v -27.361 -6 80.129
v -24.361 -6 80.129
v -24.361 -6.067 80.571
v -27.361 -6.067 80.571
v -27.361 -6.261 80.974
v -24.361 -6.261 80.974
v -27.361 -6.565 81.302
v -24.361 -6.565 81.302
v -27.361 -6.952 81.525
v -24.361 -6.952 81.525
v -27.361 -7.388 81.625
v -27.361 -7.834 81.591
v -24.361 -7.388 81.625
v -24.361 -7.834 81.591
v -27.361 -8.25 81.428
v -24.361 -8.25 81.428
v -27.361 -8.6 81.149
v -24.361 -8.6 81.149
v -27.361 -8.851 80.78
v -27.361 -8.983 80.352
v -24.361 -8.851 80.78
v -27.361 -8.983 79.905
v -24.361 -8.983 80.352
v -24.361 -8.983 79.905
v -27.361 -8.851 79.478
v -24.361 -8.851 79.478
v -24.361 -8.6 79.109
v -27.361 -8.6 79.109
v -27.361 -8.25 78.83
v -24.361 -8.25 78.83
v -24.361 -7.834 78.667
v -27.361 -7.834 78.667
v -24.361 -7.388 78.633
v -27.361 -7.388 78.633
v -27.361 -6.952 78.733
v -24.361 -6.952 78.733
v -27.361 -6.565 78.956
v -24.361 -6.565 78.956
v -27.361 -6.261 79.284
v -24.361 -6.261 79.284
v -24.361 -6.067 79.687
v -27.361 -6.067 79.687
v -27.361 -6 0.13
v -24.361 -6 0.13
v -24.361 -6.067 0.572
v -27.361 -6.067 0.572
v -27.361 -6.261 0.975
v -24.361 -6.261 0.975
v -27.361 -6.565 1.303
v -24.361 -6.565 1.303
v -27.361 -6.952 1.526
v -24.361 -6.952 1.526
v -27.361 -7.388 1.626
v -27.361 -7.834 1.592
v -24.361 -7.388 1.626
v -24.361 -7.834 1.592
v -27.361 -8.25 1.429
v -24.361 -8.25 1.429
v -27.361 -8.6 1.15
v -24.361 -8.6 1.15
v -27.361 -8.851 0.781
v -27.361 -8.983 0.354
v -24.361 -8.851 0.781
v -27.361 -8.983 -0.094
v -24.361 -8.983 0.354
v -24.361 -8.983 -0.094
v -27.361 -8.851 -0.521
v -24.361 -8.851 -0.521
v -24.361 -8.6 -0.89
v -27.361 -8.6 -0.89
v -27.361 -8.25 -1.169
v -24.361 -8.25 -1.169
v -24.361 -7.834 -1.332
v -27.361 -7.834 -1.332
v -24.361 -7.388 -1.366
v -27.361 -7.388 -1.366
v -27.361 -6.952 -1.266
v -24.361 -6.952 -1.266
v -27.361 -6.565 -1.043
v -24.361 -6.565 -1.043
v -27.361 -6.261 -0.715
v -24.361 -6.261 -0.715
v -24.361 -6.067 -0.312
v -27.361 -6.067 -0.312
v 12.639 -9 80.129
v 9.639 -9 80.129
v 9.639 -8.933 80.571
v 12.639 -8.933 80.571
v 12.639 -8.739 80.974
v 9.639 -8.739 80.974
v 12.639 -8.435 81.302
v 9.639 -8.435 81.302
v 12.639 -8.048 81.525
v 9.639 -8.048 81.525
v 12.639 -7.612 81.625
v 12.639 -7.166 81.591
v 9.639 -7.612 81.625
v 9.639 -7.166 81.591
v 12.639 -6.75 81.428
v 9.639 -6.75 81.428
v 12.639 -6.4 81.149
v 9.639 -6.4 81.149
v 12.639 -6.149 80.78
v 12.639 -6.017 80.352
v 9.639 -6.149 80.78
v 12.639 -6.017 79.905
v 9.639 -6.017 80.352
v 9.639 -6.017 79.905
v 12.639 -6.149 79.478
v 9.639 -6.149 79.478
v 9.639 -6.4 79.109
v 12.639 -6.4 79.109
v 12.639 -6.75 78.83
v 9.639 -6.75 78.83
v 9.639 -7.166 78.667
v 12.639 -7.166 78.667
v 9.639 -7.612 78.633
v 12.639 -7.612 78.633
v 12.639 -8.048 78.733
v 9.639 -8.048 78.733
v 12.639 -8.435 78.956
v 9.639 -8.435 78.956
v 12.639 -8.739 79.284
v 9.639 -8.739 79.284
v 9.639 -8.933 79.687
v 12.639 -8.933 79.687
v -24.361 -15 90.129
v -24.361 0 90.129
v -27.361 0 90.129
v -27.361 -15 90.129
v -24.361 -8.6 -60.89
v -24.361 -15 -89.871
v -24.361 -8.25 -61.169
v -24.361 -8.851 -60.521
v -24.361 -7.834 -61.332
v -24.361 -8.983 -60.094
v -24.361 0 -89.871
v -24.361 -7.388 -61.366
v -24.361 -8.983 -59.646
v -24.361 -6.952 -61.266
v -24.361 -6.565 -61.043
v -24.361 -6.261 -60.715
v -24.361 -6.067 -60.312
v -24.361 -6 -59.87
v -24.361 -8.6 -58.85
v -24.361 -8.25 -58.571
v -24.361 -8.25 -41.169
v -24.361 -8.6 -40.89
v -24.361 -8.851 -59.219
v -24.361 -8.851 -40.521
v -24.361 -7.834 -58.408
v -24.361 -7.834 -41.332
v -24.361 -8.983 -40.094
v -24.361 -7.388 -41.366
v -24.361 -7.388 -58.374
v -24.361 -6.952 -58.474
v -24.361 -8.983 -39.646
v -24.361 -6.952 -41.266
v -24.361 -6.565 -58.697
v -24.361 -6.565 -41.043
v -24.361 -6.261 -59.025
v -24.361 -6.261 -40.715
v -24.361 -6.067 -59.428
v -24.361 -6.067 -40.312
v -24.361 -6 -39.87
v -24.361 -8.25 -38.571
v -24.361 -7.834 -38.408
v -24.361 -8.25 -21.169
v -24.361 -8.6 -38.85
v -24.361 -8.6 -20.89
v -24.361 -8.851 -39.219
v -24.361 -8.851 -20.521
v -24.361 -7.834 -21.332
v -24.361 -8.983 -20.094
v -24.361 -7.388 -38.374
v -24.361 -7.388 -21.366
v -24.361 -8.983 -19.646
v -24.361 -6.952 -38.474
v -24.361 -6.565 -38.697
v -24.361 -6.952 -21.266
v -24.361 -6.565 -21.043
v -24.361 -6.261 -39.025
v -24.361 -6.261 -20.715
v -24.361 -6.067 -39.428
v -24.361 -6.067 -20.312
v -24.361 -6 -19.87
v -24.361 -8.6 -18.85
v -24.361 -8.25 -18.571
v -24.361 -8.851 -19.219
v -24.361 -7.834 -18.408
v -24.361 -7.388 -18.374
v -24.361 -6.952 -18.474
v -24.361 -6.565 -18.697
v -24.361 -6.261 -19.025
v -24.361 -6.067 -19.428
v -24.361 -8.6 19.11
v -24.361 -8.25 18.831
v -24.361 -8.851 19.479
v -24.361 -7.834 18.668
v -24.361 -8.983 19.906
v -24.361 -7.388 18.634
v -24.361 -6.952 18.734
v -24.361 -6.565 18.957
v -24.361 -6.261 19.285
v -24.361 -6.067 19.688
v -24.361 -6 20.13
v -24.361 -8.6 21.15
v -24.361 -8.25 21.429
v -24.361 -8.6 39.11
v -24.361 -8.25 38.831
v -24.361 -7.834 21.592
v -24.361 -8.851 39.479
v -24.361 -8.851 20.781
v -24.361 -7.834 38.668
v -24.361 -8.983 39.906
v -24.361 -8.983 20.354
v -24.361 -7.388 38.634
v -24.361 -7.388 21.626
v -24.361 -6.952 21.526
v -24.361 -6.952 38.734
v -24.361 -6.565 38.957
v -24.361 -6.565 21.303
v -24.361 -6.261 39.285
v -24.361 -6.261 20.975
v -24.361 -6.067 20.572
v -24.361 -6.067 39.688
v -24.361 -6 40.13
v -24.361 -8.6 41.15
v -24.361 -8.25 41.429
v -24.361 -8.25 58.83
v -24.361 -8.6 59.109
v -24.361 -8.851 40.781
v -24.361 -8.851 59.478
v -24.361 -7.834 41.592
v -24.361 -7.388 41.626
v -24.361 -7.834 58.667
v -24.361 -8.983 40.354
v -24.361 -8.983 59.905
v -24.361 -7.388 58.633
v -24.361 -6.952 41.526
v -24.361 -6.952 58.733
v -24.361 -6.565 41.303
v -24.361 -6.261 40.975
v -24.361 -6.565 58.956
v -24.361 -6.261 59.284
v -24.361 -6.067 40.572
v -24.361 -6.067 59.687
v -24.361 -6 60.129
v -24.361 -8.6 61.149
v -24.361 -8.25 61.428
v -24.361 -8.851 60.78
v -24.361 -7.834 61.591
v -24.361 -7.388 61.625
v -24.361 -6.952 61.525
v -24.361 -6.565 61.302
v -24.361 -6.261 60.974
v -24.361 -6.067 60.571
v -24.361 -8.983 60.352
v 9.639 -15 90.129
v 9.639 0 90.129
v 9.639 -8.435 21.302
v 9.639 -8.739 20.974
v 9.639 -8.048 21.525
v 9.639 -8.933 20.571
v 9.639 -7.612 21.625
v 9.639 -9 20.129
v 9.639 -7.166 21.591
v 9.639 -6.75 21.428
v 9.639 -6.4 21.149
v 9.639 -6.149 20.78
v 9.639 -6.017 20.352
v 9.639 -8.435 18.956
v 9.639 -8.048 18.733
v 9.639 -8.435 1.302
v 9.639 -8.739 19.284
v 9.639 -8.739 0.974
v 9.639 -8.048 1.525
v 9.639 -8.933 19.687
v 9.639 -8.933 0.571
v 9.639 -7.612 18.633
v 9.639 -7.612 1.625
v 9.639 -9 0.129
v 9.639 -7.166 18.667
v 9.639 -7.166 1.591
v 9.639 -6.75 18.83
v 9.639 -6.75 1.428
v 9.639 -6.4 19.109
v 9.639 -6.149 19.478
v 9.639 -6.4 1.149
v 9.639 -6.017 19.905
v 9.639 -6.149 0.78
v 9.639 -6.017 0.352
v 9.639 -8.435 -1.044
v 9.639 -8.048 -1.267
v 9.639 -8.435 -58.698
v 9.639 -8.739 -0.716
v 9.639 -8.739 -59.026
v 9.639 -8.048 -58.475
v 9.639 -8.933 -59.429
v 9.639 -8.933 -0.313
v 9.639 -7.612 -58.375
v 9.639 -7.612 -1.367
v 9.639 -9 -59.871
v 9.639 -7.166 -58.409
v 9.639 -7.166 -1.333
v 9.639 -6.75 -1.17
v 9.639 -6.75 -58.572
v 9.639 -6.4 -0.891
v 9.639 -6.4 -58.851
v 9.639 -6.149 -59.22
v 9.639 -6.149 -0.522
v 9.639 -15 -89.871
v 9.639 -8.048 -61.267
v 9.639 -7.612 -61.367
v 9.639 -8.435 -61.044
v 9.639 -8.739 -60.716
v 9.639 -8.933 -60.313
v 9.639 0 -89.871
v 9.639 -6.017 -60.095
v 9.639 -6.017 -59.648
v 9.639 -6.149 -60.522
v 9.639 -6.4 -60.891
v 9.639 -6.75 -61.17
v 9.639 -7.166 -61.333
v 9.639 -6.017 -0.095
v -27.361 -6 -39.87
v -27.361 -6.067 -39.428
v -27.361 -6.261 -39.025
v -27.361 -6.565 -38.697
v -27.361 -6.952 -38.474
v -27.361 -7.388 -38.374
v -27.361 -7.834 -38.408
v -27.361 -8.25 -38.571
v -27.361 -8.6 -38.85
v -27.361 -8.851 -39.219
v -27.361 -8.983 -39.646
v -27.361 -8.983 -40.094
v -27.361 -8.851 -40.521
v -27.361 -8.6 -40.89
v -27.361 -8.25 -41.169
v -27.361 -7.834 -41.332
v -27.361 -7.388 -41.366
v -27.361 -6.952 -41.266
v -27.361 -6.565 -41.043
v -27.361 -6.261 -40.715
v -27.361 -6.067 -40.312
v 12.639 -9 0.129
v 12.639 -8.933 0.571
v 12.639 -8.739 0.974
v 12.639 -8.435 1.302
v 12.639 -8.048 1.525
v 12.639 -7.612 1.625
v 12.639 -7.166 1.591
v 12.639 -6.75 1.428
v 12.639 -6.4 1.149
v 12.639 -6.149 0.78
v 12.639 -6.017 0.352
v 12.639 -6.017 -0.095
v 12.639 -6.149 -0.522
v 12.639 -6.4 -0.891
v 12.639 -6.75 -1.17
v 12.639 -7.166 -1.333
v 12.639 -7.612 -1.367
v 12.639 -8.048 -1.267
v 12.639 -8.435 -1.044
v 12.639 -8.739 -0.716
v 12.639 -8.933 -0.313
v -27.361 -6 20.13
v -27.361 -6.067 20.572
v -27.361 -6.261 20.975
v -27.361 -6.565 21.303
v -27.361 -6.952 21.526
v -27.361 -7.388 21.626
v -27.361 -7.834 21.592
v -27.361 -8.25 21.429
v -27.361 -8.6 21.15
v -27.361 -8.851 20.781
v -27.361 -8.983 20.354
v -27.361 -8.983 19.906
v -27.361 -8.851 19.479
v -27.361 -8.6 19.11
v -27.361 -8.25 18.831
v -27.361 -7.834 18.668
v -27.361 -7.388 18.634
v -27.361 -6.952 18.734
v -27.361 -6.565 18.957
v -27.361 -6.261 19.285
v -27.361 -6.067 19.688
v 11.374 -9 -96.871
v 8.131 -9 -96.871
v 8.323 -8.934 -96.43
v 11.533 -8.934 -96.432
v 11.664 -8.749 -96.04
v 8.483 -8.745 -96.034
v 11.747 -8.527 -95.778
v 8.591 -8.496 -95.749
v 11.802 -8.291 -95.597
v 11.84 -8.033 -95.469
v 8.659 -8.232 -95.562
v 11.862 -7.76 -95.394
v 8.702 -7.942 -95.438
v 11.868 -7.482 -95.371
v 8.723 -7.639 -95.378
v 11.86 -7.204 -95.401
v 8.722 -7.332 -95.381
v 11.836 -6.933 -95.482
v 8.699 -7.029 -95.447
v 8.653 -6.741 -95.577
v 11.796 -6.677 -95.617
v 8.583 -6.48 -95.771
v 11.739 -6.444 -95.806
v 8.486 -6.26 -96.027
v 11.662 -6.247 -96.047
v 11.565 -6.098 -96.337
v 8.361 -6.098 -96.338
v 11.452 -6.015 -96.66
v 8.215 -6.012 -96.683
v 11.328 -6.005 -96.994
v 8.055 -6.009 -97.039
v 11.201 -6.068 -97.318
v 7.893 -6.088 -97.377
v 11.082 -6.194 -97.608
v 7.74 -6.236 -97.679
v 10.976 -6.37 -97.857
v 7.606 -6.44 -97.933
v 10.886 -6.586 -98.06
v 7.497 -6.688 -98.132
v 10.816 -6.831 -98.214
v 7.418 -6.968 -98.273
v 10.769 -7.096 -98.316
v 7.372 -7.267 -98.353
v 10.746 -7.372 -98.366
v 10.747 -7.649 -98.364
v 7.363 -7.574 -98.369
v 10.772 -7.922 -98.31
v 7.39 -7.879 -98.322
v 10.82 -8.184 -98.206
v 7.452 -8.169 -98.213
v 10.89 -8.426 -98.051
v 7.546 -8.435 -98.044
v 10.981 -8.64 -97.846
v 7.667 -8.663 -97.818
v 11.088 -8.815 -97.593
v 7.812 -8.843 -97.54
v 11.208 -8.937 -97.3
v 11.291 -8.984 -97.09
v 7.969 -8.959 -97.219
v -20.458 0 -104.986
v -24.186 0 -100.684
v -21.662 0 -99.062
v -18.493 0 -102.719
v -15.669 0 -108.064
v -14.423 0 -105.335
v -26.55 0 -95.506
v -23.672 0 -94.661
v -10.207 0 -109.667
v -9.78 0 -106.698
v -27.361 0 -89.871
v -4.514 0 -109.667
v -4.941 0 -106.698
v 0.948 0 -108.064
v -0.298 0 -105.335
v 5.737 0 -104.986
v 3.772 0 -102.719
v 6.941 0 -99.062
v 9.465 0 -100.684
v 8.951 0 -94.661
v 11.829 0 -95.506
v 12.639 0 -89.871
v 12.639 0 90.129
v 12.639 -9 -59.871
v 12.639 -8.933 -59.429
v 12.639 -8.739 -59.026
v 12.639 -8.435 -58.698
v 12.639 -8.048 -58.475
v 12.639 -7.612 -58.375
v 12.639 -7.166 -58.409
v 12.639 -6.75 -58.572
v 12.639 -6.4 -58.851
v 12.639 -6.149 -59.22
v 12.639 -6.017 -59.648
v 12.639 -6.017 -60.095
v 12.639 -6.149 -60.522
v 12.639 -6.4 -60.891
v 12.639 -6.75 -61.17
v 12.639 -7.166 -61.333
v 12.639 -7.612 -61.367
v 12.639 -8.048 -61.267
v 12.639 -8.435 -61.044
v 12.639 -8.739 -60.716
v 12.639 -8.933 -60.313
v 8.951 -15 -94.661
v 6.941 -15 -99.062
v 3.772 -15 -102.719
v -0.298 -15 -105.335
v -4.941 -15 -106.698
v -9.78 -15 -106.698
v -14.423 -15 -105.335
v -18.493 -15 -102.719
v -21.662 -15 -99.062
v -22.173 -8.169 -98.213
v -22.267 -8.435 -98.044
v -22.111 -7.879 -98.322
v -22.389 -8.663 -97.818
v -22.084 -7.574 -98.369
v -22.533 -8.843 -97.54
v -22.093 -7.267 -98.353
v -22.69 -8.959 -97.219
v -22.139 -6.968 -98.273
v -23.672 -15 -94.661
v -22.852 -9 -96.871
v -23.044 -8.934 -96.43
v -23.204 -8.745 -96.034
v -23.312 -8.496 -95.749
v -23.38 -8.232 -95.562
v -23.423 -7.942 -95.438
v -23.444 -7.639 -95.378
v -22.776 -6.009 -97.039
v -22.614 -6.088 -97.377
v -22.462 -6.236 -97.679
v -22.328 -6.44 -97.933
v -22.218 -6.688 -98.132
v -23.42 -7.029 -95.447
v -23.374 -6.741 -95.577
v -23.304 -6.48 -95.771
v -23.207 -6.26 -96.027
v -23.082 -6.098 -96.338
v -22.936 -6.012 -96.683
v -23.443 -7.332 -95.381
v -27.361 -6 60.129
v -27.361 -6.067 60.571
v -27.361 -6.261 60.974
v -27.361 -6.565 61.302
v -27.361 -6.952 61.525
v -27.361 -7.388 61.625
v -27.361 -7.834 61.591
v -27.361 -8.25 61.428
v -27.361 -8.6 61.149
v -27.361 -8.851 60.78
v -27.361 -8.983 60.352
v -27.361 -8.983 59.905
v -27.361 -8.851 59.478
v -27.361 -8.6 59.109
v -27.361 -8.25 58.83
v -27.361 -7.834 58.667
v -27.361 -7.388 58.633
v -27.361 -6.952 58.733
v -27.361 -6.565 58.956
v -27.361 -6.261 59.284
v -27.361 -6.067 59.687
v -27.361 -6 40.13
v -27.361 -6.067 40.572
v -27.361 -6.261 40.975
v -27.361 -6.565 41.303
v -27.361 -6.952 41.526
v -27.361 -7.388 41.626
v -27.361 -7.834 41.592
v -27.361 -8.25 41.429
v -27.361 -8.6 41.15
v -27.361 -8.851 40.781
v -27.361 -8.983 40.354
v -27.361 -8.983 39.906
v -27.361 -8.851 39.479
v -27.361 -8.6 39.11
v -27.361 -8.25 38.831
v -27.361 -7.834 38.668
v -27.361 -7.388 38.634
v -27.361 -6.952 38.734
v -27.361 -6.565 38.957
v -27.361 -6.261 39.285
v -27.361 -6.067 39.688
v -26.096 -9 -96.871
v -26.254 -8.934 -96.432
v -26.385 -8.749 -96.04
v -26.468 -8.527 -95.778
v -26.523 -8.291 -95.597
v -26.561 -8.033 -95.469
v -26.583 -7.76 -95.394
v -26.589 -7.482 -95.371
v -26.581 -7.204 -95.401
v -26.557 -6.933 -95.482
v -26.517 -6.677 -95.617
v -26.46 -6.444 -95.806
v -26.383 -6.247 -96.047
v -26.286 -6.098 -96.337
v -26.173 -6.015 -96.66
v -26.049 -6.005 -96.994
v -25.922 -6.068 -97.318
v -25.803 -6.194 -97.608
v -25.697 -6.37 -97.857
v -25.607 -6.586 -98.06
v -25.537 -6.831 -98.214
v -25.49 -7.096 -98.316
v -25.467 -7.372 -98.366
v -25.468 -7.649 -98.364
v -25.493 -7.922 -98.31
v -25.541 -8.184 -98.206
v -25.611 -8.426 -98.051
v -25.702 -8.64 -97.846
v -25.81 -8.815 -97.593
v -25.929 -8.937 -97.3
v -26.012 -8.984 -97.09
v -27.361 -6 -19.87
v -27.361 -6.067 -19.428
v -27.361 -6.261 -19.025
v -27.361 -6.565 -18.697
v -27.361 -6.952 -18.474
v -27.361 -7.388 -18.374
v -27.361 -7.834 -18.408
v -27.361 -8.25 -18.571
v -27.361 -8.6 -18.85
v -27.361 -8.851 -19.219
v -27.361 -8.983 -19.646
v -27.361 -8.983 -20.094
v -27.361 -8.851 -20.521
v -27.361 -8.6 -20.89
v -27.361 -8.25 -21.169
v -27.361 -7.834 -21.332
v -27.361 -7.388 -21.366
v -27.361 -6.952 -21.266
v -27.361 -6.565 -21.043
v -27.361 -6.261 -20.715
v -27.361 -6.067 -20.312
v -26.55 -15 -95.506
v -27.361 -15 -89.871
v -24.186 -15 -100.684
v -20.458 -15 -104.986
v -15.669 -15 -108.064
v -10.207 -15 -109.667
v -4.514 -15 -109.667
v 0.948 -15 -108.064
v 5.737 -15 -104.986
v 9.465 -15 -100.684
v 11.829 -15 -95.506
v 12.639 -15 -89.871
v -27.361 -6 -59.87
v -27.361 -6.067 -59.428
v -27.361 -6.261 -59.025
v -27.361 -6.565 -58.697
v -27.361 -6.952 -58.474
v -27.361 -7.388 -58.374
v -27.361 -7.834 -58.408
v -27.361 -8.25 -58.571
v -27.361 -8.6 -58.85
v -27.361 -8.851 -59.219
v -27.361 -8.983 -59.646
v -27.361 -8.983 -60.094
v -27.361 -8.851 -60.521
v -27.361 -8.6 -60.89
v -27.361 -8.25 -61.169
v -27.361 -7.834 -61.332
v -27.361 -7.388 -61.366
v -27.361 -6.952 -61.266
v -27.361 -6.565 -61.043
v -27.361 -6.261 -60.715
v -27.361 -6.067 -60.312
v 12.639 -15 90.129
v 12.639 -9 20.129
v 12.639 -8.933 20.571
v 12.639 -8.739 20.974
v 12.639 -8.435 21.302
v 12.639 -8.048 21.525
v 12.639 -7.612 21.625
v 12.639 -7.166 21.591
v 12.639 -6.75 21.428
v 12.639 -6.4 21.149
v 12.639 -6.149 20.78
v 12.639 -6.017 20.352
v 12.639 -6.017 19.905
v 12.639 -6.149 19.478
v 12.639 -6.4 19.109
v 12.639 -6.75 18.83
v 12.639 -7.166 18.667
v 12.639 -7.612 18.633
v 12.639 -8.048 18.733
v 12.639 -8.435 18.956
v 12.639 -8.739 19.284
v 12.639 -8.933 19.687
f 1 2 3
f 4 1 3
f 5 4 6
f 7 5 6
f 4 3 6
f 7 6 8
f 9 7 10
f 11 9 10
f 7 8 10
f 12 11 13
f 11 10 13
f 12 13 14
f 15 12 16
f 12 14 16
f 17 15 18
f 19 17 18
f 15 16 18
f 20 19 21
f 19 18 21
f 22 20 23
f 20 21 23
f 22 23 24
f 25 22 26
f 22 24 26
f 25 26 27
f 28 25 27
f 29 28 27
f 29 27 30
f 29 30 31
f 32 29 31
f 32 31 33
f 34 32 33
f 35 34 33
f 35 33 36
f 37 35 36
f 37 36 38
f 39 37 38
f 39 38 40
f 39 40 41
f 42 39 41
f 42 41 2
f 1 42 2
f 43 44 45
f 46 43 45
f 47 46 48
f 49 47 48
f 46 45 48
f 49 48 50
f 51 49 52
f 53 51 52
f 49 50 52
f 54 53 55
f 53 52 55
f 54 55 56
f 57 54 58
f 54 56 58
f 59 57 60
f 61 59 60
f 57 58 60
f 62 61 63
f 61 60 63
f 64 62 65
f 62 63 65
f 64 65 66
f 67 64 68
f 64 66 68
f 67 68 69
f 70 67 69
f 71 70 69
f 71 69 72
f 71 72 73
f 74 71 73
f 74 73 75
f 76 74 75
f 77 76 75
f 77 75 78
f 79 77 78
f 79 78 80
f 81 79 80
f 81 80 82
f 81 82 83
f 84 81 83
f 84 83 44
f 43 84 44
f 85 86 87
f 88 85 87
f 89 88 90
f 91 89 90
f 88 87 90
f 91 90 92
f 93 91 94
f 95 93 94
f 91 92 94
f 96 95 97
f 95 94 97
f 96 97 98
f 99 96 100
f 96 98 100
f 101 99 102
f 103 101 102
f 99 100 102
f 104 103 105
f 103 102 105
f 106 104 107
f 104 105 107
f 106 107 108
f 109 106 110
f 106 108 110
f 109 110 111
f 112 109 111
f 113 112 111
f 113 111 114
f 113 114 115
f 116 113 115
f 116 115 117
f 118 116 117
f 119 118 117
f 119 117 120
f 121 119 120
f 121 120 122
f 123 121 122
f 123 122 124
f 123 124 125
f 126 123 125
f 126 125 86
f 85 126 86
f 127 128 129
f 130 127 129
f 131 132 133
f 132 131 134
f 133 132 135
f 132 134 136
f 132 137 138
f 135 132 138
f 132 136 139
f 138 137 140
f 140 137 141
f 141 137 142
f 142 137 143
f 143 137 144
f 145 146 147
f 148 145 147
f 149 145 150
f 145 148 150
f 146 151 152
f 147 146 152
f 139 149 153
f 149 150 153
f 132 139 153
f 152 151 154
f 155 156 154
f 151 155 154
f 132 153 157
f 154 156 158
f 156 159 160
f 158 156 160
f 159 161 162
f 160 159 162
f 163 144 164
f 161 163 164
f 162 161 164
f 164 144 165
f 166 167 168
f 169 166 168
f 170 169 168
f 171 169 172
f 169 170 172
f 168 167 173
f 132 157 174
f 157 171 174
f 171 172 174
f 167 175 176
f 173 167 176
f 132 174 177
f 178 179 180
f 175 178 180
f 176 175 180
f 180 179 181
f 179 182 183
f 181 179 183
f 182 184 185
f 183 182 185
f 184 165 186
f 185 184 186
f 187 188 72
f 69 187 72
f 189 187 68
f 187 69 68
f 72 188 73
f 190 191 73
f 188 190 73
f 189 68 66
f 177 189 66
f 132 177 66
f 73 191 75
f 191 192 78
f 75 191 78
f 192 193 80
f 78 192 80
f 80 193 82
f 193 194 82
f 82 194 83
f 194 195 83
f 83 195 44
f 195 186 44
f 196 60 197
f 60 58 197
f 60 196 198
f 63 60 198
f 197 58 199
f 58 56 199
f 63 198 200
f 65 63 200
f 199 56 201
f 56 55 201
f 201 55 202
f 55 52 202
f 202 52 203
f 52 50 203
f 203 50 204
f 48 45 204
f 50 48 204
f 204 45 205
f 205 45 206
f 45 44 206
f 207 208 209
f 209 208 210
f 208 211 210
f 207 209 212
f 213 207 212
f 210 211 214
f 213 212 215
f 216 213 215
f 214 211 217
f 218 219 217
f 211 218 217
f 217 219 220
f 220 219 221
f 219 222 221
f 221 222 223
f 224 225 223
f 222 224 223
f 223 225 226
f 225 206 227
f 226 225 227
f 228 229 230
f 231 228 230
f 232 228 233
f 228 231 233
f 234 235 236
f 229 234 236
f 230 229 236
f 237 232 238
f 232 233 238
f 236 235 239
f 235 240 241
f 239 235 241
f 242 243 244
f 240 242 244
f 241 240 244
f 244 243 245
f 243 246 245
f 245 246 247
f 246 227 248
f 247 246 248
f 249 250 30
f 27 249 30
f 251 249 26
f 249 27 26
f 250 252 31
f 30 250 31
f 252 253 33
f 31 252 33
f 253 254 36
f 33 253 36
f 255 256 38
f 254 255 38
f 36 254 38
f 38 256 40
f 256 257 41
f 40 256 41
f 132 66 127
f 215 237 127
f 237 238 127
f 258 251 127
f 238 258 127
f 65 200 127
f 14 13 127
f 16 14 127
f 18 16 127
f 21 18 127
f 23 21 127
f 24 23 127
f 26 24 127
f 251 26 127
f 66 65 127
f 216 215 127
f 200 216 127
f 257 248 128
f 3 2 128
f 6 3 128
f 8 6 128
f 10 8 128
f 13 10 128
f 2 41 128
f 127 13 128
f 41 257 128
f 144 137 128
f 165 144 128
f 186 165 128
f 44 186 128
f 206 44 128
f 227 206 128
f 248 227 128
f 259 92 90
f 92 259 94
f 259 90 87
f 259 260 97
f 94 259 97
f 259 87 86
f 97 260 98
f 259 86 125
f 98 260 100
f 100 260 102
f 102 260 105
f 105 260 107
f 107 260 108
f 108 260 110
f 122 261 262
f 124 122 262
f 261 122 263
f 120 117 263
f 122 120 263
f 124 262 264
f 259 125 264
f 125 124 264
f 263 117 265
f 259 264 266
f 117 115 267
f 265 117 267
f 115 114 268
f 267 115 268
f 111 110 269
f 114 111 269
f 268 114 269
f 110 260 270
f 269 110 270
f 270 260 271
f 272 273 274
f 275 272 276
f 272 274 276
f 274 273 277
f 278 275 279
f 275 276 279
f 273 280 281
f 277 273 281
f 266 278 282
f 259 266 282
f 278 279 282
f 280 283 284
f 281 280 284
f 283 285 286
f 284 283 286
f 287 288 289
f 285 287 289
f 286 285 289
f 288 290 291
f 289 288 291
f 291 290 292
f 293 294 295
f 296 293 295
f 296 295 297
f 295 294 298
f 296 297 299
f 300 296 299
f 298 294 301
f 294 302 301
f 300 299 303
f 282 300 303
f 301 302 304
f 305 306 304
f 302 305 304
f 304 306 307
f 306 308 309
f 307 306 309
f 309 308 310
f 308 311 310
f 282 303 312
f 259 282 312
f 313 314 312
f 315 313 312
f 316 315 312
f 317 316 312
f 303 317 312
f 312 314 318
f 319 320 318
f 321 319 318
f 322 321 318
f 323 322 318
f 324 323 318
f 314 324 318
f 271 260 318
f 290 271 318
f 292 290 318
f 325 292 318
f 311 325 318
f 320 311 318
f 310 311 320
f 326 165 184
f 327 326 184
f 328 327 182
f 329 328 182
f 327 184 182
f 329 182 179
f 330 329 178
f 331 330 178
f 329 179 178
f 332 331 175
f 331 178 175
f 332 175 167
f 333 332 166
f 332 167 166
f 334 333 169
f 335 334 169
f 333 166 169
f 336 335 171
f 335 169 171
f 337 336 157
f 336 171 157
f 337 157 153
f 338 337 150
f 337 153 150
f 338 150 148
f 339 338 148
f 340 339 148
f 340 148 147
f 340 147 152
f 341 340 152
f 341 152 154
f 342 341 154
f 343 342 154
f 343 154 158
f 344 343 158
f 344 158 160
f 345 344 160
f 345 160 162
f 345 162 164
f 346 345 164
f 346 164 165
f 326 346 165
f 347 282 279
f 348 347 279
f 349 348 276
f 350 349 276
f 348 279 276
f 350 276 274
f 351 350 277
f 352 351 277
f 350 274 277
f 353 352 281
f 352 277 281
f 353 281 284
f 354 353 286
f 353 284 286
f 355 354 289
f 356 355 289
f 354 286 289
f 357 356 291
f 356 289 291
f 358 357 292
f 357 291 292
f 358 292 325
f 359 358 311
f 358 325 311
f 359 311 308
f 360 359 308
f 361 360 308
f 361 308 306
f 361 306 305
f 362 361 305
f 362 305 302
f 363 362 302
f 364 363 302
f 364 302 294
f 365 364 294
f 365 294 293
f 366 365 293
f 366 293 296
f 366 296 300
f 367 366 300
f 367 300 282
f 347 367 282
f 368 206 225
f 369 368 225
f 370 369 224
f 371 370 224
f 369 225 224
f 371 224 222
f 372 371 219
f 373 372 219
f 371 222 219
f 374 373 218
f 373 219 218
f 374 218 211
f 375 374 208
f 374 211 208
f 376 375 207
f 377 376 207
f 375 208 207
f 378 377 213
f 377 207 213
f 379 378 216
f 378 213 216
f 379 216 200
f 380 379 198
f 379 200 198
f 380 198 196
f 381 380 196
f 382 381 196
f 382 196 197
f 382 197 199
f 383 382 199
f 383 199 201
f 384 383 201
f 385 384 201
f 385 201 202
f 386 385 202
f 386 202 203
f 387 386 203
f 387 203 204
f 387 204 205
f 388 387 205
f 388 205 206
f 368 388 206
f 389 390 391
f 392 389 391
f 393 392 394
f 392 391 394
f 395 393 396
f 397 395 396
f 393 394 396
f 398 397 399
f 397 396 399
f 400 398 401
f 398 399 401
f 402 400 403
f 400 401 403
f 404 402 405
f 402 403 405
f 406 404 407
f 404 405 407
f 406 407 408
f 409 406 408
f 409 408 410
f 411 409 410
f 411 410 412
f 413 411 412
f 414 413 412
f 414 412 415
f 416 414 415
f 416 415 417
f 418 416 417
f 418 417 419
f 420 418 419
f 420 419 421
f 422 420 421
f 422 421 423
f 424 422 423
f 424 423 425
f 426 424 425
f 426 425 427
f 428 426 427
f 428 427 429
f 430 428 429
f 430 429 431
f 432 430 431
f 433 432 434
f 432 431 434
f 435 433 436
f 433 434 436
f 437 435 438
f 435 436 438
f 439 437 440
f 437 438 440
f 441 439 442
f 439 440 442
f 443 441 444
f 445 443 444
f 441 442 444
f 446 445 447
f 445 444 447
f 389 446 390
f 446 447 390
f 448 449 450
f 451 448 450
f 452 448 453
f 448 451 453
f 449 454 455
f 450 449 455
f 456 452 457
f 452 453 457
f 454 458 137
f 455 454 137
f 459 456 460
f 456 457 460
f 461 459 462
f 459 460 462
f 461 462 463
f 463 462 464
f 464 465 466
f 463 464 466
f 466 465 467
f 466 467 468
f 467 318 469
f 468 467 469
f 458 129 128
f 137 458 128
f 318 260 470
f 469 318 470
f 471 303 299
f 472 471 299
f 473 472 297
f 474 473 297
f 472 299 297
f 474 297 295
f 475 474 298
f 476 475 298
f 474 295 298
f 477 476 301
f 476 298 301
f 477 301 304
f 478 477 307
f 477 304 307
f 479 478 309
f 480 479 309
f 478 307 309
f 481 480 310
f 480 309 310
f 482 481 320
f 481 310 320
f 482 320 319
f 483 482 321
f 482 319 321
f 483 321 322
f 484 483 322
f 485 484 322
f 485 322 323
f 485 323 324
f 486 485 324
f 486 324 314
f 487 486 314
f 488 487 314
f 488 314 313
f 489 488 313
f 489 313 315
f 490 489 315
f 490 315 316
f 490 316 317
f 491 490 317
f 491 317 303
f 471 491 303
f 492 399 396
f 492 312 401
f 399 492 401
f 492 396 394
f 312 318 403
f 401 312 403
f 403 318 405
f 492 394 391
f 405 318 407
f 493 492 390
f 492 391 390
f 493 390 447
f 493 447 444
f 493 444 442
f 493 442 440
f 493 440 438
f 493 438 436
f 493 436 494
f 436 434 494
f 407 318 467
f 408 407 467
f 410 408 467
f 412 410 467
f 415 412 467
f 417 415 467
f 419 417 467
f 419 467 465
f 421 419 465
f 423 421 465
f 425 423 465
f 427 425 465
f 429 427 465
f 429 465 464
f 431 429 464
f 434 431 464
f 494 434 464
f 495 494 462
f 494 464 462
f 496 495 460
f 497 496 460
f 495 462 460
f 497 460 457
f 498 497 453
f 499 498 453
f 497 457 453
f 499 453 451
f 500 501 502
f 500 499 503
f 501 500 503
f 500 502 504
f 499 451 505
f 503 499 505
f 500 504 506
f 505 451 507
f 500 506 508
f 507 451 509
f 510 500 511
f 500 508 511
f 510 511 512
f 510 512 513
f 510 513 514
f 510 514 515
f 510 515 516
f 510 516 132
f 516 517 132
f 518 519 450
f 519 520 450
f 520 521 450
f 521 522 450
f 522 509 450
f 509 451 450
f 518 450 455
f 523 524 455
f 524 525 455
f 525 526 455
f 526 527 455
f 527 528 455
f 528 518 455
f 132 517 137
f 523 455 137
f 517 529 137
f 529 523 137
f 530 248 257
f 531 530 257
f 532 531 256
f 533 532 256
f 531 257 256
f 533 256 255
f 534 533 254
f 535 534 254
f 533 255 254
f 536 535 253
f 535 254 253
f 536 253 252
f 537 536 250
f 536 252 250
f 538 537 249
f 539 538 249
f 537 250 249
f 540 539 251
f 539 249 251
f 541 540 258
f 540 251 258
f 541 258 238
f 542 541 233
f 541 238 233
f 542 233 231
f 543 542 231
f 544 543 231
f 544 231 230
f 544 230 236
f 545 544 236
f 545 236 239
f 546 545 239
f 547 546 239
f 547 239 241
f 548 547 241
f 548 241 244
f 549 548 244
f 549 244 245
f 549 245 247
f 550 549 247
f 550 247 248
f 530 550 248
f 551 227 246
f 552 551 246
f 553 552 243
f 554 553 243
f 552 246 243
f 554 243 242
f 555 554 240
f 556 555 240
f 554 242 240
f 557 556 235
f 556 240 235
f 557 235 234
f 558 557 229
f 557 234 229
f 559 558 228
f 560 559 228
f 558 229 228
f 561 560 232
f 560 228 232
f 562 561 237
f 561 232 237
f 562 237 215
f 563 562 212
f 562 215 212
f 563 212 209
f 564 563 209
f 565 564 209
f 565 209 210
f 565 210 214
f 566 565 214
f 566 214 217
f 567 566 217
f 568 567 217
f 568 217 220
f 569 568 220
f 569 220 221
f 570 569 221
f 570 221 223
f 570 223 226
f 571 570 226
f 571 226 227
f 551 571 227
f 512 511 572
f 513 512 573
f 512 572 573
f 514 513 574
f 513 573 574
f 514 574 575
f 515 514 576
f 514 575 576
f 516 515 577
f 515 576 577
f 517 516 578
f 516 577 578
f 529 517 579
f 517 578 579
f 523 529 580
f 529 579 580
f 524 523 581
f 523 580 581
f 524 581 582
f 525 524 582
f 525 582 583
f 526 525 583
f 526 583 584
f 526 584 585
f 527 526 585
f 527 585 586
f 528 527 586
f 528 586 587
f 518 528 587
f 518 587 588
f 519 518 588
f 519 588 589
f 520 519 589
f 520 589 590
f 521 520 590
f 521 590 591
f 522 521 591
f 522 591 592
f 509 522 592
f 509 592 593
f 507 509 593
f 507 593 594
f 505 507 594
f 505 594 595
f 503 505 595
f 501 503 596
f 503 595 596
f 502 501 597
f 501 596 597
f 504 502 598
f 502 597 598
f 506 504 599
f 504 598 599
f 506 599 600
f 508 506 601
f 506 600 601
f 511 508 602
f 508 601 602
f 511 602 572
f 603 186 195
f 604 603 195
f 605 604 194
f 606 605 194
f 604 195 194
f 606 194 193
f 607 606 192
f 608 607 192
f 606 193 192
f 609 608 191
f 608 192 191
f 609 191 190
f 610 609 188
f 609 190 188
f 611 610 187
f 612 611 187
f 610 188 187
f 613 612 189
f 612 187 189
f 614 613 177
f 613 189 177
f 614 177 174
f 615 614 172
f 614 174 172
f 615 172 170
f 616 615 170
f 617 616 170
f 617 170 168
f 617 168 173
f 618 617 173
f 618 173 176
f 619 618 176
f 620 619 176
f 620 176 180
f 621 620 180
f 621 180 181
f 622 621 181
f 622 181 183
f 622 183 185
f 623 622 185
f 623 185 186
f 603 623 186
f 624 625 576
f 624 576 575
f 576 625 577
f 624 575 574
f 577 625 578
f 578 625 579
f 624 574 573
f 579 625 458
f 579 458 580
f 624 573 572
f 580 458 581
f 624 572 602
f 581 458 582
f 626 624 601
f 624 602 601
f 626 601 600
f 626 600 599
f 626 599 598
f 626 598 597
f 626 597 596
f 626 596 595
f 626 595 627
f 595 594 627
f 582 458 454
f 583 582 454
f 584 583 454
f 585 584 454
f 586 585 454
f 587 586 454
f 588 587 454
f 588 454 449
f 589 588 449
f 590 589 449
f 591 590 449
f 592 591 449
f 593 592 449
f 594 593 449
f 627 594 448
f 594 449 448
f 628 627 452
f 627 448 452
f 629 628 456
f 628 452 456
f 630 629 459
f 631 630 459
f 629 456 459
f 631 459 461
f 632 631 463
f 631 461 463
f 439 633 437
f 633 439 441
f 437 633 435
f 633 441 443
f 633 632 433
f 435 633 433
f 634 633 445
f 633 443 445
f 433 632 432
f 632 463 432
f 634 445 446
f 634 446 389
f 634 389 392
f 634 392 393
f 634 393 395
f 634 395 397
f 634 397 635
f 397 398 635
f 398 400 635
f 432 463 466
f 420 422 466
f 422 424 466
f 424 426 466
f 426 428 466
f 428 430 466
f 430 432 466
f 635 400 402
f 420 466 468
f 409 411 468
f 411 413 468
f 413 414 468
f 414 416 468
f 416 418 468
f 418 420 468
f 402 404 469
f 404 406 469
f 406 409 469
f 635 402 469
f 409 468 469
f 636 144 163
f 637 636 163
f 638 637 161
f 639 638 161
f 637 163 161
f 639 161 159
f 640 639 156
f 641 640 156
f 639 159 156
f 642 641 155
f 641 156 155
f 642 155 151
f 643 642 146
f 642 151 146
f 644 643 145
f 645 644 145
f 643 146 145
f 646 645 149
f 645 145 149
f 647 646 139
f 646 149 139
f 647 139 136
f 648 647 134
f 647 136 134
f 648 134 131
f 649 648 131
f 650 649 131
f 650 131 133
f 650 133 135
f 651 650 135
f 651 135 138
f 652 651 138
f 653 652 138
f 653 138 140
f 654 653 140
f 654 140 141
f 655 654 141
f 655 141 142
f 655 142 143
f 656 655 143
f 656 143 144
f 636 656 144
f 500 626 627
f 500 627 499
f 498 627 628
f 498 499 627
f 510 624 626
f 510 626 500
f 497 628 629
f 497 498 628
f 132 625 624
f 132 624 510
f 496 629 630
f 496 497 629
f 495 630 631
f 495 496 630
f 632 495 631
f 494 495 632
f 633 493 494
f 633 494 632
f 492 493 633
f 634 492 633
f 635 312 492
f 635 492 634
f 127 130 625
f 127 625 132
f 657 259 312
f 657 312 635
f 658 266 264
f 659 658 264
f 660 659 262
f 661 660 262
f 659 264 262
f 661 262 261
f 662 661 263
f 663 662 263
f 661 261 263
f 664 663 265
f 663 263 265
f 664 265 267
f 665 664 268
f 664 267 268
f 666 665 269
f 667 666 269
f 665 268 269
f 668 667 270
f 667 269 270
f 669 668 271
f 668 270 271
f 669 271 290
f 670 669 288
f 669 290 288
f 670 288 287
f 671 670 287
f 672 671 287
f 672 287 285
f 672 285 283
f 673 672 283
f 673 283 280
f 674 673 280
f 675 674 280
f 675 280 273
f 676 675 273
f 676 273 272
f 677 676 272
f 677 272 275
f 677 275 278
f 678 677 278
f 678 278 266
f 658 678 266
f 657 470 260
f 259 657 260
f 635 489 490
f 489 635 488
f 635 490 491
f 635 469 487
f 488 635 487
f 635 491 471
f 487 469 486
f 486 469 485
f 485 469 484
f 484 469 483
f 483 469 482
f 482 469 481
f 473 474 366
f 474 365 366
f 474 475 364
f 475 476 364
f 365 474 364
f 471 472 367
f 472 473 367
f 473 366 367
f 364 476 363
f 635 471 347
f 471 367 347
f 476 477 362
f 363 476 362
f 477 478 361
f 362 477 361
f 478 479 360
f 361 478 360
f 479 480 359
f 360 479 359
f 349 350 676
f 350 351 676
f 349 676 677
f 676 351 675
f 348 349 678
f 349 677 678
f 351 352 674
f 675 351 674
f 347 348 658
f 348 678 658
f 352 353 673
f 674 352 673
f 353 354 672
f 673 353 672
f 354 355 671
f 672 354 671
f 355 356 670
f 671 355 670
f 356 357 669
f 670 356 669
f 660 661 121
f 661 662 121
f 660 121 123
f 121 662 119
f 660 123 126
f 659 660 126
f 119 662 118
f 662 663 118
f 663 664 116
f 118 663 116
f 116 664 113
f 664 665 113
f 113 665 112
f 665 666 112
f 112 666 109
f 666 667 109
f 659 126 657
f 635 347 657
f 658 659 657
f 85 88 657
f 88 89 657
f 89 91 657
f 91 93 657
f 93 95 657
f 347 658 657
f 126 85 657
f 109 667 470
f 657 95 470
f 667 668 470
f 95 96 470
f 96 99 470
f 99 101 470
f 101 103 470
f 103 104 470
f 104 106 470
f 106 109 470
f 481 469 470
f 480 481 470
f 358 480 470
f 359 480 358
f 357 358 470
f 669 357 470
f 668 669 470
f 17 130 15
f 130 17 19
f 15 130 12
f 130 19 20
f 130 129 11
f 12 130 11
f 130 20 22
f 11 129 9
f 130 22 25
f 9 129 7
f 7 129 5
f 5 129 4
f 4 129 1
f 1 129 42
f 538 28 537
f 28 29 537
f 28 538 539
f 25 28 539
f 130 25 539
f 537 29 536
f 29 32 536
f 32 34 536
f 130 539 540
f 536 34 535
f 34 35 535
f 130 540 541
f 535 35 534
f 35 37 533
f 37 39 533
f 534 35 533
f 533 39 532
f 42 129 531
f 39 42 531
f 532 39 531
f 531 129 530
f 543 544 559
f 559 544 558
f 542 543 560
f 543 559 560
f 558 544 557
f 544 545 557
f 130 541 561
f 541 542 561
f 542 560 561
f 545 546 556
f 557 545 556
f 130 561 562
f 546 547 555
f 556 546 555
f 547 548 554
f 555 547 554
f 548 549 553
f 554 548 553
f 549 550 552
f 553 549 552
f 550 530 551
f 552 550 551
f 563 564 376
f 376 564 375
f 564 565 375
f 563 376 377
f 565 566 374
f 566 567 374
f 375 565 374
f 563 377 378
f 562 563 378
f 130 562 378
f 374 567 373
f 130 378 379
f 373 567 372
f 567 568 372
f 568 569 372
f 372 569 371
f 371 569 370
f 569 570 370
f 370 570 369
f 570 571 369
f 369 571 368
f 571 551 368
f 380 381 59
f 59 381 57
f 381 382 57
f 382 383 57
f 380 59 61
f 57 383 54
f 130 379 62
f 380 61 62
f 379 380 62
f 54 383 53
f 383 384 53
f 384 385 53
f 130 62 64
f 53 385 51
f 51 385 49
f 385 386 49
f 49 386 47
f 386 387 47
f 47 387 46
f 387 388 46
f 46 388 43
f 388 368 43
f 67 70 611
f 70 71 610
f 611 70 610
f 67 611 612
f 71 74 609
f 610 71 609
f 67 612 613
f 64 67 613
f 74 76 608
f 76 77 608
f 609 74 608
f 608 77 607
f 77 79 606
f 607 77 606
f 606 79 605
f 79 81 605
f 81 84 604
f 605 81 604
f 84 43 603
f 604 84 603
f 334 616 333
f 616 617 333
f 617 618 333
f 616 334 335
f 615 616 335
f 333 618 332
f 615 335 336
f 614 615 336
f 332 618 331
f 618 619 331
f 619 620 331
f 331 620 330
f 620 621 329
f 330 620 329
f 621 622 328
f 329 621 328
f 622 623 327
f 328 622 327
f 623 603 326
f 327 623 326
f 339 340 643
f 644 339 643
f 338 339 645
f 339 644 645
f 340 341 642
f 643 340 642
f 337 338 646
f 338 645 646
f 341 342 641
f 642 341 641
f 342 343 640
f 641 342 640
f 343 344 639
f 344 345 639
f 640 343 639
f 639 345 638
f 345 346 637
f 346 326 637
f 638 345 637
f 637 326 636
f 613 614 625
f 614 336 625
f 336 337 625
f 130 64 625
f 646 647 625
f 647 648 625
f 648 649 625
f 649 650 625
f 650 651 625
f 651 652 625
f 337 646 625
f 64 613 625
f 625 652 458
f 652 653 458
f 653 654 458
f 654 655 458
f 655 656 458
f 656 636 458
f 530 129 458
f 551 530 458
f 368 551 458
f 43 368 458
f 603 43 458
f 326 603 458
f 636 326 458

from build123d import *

# Parameters (mm, degrees)
F1_DEPTH = 15
F3_D     = 3
F3_DEPTH = 10
F5_D     = 3
F5_DEPTH = 10
F7_D     = 3
F7_DEPTH = 50


with BuildPart() as f1:
    # F0 (on Front) → F1 (new body)
    with BuildSketch(Plane.XZ):
        with BuildLine():
            Line((-27.360521, 90.12893), (-27.360521, -89.87107))
            ThreePointArc((-27.360521, -89.87107), (-7.360521, -109.87107), (12.639479, -89.87107))
            Line((12.639479, -89.87107), (12.639479, 90.12893))
            Line((12.639479, 90.12893), (9.639479, 90.12893))
            Line((9.639479, 90.12893), (9.639479, -89.87107))
            ThreePointArc((9.639479, -89.87107), (-7.360521, -106.87107), (-24.360521, -89.87107))
            Line((-24.360521, -89.87107), (-24.360521, 90.12893))
            Line((-24.360521, 90.12893), (-27.360521, 90.12893))
        make_face()
    extrude(amount=F1_DEPTH)

    # F3
    with Locations(Plane(origin=(-27.360521, 0, 0), x_dir=(0, -1, 0), z_dir=(-1, 0, 0))):
        with Locations((7.5, 80.12893), (7.5, 20.130026), (7.5, 0.130026), (7.5, -59.869974), (7.5, 60.12893), (7.5, 40.130026), (7.5, -19.869974), (7.5, -39.869974)):
            Hole(F3_D / 2, depth=F3_DEPTH)

    # F5
    with Locations(Plane.YZ.offset(12.639479)):
        with Locations((-7.5, 80.12893), (-7.5, 20.12893), (-7.5, 0.12893), (-7.5, -59.87107)):
            Hole(F5_D / 2, depth=F5_DEPTH)

    # F7
    with Locations(Plane.YZ.offset(12.639479)):
        with Locations((-7.5, -96.87107)):
            Hole(F7_D / 2, depth=F7_DEPTH)


solid = f1.part
